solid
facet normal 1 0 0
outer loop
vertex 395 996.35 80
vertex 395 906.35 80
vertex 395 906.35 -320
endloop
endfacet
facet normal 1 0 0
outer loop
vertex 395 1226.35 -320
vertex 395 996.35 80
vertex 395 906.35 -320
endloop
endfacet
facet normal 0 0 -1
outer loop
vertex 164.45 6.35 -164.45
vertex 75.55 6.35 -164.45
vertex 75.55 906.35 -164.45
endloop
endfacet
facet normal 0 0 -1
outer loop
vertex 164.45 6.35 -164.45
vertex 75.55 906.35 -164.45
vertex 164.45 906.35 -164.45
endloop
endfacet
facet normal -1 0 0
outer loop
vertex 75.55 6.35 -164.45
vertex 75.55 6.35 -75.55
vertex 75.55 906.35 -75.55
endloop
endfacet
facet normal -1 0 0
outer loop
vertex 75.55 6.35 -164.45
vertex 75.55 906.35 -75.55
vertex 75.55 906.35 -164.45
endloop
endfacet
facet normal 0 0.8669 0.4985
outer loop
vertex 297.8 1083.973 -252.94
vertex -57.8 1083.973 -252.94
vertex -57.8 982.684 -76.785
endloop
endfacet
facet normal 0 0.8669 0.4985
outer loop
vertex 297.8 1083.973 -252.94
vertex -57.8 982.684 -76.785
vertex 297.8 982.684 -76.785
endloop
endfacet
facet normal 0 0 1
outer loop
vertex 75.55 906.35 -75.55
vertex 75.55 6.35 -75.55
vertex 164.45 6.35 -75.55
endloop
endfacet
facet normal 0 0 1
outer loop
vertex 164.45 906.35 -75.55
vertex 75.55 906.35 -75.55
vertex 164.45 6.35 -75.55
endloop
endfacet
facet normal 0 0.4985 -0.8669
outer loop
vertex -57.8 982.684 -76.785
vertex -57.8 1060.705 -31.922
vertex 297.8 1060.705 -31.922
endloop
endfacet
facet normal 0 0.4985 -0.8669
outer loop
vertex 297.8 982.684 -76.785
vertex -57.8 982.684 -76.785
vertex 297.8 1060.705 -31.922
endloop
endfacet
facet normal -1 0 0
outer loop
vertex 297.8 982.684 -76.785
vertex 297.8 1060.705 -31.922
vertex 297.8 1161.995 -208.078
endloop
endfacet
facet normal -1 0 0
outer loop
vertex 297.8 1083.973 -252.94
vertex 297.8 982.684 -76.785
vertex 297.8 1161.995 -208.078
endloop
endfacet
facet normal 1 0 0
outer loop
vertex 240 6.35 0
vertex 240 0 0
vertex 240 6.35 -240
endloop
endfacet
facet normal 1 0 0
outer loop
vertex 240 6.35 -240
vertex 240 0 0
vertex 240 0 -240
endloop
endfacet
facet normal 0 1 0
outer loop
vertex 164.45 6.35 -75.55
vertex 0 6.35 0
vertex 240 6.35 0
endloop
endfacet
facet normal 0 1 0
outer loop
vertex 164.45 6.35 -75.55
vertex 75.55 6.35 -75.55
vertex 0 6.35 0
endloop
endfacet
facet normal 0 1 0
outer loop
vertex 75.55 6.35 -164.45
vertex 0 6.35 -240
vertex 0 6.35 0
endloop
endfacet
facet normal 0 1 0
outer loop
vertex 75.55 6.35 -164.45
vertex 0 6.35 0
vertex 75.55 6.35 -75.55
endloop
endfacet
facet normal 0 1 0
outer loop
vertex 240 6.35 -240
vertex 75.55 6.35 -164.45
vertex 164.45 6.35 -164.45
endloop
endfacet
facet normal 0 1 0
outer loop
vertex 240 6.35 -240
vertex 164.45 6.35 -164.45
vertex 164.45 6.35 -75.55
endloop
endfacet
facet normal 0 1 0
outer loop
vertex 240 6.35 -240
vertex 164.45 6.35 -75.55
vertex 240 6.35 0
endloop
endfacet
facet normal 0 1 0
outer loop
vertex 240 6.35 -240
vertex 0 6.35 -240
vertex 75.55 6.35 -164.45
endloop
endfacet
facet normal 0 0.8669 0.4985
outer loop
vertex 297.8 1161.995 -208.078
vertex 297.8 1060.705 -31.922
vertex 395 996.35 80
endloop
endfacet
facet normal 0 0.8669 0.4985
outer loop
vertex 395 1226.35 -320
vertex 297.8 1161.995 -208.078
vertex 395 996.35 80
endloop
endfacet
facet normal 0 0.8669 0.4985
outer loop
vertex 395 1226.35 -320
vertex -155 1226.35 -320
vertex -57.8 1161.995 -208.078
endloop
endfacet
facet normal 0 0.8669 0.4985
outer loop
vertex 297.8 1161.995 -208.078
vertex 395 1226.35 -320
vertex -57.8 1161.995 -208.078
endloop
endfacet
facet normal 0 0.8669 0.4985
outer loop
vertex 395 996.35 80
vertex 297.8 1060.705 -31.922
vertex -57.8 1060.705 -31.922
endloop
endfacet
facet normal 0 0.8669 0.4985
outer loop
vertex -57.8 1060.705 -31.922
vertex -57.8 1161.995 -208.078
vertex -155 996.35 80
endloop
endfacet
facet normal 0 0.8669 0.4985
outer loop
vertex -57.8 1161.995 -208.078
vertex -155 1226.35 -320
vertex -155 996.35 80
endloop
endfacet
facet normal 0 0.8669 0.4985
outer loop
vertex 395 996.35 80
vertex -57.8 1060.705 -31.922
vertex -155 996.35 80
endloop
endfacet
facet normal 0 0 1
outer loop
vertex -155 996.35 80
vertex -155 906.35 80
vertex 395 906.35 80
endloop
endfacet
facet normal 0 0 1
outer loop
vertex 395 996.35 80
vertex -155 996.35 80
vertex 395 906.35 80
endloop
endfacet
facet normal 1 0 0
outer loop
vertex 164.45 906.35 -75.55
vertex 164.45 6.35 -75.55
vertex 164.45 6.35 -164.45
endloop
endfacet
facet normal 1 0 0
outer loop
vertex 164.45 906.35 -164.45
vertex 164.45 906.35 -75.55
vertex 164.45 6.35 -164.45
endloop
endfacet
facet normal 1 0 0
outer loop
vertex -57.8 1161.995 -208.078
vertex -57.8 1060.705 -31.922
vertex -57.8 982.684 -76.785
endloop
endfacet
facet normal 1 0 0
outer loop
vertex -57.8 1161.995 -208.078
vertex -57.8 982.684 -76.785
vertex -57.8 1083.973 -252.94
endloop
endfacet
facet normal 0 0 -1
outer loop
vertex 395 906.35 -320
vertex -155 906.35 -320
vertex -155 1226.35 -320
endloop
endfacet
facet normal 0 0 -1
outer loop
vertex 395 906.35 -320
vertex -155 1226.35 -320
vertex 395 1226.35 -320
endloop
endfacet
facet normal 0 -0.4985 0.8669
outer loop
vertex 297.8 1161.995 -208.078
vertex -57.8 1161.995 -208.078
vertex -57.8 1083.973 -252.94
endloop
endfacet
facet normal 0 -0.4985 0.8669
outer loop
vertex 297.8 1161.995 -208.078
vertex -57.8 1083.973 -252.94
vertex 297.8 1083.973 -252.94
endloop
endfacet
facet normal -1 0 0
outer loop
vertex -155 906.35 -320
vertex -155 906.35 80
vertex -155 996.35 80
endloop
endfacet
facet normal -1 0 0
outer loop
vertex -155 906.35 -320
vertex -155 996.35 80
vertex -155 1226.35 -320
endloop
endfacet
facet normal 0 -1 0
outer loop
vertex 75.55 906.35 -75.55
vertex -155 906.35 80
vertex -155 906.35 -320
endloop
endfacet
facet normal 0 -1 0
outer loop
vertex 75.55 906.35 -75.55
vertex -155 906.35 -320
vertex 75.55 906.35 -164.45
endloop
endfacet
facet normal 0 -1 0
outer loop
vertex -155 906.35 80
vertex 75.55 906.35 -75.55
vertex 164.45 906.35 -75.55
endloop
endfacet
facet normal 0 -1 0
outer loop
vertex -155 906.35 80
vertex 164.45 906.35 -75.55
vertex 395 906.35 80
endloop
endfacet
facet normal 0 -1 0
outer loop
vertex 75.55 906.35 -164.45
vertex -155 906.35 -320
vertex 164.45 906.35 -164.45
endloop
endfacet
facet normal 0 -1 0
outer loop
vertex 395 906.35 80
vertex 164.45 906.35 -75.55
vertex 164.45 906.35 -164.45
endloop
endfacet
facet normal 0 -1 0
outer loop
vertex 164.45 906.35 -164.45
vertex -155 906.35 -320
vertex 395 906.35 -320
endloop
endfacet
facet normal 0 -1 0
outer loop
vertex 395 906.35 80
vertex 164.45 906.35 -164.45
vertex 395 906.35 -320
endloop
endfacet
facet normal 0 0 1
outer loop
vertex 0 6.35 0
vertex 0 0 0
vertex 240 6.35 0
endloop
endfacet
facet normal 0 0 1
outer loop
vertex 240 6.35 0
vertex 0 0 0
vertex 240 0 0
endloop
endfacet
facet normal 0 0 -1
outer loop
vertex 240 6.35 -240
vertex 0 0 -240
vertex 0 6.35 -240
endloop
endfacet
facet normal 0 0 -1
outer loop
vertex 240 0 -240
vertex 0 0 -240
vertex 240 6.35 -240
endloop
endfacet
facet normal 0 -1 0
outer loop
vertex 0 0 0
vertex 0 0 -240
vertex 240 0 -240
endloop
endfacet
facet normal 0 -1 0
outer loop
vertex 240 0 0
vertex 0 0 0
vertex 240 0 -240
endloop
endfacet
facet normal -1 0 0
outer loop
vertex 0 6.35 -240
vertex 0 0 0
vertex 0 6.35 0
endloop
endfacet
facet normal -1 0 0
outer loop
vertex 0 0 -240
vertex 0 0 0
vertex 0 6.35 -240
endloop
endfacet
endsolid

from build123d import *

# Parameters (mm, degrees)
CROQUIS1_W              = 240
CROQUIS1_H              = 240
SALIENTE_EXTRUIR1_DEPTH = 6.35
CROQUIS2_W              = 88.9
CROQUIS2_H              = 88.9
SALIENTE_EXTRUIR2_DEPTH = 900
CROQUIS3_W              = 550
CROQUIS3_H              = 400
SALIENTE_EXTRUIR3_DEPTH = 320
CORTAR_EXTRUIR1_DEPTH   = 550
CROQUIS6_W              = 355.6
CROQUIS6_H              = 203.2
CORTAR_EXTRUIR2_DEPTH   = 90


with BuildPart() as part:
    # Croquis1 → Saliente-Extruir1 (new body)
    with BuildSketch(Plane(origin=(0, 0, 0), x_dir=(1, 0, 0), z_dir=(0, 1, 0))):
        with Locations((120, 120)):
            Rectangle(CROQUIS1_W, CROQUIS1_H)
    extrude(amount=SALIENTE_EXTRUIR1_DEPTH)

    # Croquis2 → Saliente-Extruir2 (add)
    with BuildSketch(Plane(origin=(0, 6.35, 0), x_dir=(1, 0, 0), z_dir=(0, 1, 0))):
        with Locations((120, 120)):
            Rectangle(CROQUIS2_W, CROQUIS2_H)
    extrude(amount=SALIENTE_EXTRUIR2_DEPTH)

    # Croquis3 → Saliente-Extruir3 (add)
    with BuildSketch(Plane(origin=(0, 906.35, 0), x_dir=(1, 0, 0), z_dir=(0, 1, 0))):
        with Locations((120, 120)):
            Rectangle(CROQUIS3_W, CROQUIS3_H)
    extrude(amount=SALIENTE_EXTRUIR3_DEPTH)

    # Croquis4 → Cortar-Extruir1 (cut)
    with BuildSketch(Plane.ZY.offset(155)):
        Polygon((-320, 1226.35), (80, 996.35), (80, 1226.35), align=None)
    extrude(amount=-CORTAR_EXTRUIR1_DEPTH, mode=Mode.SUBTRACT)

    # Croquis6 → Cortar-Extruir2 (cut)
    with BuildSketch(Plane(origin=(0, 783.353687177, 450.428370127), x_dir=(1, 0, 0), z_dir=(0, 0.8669063030575354, 0.4984711242580827))):
        with Locations((120, 658.004640311)):
            Rectangle(CROQUIS6_W, CROQUIS6_H)
    extrude(amount=-CORTAR_EXTRUIR2_DEPTH, mode=Mode.SUBTRACT)


solid = part.part
